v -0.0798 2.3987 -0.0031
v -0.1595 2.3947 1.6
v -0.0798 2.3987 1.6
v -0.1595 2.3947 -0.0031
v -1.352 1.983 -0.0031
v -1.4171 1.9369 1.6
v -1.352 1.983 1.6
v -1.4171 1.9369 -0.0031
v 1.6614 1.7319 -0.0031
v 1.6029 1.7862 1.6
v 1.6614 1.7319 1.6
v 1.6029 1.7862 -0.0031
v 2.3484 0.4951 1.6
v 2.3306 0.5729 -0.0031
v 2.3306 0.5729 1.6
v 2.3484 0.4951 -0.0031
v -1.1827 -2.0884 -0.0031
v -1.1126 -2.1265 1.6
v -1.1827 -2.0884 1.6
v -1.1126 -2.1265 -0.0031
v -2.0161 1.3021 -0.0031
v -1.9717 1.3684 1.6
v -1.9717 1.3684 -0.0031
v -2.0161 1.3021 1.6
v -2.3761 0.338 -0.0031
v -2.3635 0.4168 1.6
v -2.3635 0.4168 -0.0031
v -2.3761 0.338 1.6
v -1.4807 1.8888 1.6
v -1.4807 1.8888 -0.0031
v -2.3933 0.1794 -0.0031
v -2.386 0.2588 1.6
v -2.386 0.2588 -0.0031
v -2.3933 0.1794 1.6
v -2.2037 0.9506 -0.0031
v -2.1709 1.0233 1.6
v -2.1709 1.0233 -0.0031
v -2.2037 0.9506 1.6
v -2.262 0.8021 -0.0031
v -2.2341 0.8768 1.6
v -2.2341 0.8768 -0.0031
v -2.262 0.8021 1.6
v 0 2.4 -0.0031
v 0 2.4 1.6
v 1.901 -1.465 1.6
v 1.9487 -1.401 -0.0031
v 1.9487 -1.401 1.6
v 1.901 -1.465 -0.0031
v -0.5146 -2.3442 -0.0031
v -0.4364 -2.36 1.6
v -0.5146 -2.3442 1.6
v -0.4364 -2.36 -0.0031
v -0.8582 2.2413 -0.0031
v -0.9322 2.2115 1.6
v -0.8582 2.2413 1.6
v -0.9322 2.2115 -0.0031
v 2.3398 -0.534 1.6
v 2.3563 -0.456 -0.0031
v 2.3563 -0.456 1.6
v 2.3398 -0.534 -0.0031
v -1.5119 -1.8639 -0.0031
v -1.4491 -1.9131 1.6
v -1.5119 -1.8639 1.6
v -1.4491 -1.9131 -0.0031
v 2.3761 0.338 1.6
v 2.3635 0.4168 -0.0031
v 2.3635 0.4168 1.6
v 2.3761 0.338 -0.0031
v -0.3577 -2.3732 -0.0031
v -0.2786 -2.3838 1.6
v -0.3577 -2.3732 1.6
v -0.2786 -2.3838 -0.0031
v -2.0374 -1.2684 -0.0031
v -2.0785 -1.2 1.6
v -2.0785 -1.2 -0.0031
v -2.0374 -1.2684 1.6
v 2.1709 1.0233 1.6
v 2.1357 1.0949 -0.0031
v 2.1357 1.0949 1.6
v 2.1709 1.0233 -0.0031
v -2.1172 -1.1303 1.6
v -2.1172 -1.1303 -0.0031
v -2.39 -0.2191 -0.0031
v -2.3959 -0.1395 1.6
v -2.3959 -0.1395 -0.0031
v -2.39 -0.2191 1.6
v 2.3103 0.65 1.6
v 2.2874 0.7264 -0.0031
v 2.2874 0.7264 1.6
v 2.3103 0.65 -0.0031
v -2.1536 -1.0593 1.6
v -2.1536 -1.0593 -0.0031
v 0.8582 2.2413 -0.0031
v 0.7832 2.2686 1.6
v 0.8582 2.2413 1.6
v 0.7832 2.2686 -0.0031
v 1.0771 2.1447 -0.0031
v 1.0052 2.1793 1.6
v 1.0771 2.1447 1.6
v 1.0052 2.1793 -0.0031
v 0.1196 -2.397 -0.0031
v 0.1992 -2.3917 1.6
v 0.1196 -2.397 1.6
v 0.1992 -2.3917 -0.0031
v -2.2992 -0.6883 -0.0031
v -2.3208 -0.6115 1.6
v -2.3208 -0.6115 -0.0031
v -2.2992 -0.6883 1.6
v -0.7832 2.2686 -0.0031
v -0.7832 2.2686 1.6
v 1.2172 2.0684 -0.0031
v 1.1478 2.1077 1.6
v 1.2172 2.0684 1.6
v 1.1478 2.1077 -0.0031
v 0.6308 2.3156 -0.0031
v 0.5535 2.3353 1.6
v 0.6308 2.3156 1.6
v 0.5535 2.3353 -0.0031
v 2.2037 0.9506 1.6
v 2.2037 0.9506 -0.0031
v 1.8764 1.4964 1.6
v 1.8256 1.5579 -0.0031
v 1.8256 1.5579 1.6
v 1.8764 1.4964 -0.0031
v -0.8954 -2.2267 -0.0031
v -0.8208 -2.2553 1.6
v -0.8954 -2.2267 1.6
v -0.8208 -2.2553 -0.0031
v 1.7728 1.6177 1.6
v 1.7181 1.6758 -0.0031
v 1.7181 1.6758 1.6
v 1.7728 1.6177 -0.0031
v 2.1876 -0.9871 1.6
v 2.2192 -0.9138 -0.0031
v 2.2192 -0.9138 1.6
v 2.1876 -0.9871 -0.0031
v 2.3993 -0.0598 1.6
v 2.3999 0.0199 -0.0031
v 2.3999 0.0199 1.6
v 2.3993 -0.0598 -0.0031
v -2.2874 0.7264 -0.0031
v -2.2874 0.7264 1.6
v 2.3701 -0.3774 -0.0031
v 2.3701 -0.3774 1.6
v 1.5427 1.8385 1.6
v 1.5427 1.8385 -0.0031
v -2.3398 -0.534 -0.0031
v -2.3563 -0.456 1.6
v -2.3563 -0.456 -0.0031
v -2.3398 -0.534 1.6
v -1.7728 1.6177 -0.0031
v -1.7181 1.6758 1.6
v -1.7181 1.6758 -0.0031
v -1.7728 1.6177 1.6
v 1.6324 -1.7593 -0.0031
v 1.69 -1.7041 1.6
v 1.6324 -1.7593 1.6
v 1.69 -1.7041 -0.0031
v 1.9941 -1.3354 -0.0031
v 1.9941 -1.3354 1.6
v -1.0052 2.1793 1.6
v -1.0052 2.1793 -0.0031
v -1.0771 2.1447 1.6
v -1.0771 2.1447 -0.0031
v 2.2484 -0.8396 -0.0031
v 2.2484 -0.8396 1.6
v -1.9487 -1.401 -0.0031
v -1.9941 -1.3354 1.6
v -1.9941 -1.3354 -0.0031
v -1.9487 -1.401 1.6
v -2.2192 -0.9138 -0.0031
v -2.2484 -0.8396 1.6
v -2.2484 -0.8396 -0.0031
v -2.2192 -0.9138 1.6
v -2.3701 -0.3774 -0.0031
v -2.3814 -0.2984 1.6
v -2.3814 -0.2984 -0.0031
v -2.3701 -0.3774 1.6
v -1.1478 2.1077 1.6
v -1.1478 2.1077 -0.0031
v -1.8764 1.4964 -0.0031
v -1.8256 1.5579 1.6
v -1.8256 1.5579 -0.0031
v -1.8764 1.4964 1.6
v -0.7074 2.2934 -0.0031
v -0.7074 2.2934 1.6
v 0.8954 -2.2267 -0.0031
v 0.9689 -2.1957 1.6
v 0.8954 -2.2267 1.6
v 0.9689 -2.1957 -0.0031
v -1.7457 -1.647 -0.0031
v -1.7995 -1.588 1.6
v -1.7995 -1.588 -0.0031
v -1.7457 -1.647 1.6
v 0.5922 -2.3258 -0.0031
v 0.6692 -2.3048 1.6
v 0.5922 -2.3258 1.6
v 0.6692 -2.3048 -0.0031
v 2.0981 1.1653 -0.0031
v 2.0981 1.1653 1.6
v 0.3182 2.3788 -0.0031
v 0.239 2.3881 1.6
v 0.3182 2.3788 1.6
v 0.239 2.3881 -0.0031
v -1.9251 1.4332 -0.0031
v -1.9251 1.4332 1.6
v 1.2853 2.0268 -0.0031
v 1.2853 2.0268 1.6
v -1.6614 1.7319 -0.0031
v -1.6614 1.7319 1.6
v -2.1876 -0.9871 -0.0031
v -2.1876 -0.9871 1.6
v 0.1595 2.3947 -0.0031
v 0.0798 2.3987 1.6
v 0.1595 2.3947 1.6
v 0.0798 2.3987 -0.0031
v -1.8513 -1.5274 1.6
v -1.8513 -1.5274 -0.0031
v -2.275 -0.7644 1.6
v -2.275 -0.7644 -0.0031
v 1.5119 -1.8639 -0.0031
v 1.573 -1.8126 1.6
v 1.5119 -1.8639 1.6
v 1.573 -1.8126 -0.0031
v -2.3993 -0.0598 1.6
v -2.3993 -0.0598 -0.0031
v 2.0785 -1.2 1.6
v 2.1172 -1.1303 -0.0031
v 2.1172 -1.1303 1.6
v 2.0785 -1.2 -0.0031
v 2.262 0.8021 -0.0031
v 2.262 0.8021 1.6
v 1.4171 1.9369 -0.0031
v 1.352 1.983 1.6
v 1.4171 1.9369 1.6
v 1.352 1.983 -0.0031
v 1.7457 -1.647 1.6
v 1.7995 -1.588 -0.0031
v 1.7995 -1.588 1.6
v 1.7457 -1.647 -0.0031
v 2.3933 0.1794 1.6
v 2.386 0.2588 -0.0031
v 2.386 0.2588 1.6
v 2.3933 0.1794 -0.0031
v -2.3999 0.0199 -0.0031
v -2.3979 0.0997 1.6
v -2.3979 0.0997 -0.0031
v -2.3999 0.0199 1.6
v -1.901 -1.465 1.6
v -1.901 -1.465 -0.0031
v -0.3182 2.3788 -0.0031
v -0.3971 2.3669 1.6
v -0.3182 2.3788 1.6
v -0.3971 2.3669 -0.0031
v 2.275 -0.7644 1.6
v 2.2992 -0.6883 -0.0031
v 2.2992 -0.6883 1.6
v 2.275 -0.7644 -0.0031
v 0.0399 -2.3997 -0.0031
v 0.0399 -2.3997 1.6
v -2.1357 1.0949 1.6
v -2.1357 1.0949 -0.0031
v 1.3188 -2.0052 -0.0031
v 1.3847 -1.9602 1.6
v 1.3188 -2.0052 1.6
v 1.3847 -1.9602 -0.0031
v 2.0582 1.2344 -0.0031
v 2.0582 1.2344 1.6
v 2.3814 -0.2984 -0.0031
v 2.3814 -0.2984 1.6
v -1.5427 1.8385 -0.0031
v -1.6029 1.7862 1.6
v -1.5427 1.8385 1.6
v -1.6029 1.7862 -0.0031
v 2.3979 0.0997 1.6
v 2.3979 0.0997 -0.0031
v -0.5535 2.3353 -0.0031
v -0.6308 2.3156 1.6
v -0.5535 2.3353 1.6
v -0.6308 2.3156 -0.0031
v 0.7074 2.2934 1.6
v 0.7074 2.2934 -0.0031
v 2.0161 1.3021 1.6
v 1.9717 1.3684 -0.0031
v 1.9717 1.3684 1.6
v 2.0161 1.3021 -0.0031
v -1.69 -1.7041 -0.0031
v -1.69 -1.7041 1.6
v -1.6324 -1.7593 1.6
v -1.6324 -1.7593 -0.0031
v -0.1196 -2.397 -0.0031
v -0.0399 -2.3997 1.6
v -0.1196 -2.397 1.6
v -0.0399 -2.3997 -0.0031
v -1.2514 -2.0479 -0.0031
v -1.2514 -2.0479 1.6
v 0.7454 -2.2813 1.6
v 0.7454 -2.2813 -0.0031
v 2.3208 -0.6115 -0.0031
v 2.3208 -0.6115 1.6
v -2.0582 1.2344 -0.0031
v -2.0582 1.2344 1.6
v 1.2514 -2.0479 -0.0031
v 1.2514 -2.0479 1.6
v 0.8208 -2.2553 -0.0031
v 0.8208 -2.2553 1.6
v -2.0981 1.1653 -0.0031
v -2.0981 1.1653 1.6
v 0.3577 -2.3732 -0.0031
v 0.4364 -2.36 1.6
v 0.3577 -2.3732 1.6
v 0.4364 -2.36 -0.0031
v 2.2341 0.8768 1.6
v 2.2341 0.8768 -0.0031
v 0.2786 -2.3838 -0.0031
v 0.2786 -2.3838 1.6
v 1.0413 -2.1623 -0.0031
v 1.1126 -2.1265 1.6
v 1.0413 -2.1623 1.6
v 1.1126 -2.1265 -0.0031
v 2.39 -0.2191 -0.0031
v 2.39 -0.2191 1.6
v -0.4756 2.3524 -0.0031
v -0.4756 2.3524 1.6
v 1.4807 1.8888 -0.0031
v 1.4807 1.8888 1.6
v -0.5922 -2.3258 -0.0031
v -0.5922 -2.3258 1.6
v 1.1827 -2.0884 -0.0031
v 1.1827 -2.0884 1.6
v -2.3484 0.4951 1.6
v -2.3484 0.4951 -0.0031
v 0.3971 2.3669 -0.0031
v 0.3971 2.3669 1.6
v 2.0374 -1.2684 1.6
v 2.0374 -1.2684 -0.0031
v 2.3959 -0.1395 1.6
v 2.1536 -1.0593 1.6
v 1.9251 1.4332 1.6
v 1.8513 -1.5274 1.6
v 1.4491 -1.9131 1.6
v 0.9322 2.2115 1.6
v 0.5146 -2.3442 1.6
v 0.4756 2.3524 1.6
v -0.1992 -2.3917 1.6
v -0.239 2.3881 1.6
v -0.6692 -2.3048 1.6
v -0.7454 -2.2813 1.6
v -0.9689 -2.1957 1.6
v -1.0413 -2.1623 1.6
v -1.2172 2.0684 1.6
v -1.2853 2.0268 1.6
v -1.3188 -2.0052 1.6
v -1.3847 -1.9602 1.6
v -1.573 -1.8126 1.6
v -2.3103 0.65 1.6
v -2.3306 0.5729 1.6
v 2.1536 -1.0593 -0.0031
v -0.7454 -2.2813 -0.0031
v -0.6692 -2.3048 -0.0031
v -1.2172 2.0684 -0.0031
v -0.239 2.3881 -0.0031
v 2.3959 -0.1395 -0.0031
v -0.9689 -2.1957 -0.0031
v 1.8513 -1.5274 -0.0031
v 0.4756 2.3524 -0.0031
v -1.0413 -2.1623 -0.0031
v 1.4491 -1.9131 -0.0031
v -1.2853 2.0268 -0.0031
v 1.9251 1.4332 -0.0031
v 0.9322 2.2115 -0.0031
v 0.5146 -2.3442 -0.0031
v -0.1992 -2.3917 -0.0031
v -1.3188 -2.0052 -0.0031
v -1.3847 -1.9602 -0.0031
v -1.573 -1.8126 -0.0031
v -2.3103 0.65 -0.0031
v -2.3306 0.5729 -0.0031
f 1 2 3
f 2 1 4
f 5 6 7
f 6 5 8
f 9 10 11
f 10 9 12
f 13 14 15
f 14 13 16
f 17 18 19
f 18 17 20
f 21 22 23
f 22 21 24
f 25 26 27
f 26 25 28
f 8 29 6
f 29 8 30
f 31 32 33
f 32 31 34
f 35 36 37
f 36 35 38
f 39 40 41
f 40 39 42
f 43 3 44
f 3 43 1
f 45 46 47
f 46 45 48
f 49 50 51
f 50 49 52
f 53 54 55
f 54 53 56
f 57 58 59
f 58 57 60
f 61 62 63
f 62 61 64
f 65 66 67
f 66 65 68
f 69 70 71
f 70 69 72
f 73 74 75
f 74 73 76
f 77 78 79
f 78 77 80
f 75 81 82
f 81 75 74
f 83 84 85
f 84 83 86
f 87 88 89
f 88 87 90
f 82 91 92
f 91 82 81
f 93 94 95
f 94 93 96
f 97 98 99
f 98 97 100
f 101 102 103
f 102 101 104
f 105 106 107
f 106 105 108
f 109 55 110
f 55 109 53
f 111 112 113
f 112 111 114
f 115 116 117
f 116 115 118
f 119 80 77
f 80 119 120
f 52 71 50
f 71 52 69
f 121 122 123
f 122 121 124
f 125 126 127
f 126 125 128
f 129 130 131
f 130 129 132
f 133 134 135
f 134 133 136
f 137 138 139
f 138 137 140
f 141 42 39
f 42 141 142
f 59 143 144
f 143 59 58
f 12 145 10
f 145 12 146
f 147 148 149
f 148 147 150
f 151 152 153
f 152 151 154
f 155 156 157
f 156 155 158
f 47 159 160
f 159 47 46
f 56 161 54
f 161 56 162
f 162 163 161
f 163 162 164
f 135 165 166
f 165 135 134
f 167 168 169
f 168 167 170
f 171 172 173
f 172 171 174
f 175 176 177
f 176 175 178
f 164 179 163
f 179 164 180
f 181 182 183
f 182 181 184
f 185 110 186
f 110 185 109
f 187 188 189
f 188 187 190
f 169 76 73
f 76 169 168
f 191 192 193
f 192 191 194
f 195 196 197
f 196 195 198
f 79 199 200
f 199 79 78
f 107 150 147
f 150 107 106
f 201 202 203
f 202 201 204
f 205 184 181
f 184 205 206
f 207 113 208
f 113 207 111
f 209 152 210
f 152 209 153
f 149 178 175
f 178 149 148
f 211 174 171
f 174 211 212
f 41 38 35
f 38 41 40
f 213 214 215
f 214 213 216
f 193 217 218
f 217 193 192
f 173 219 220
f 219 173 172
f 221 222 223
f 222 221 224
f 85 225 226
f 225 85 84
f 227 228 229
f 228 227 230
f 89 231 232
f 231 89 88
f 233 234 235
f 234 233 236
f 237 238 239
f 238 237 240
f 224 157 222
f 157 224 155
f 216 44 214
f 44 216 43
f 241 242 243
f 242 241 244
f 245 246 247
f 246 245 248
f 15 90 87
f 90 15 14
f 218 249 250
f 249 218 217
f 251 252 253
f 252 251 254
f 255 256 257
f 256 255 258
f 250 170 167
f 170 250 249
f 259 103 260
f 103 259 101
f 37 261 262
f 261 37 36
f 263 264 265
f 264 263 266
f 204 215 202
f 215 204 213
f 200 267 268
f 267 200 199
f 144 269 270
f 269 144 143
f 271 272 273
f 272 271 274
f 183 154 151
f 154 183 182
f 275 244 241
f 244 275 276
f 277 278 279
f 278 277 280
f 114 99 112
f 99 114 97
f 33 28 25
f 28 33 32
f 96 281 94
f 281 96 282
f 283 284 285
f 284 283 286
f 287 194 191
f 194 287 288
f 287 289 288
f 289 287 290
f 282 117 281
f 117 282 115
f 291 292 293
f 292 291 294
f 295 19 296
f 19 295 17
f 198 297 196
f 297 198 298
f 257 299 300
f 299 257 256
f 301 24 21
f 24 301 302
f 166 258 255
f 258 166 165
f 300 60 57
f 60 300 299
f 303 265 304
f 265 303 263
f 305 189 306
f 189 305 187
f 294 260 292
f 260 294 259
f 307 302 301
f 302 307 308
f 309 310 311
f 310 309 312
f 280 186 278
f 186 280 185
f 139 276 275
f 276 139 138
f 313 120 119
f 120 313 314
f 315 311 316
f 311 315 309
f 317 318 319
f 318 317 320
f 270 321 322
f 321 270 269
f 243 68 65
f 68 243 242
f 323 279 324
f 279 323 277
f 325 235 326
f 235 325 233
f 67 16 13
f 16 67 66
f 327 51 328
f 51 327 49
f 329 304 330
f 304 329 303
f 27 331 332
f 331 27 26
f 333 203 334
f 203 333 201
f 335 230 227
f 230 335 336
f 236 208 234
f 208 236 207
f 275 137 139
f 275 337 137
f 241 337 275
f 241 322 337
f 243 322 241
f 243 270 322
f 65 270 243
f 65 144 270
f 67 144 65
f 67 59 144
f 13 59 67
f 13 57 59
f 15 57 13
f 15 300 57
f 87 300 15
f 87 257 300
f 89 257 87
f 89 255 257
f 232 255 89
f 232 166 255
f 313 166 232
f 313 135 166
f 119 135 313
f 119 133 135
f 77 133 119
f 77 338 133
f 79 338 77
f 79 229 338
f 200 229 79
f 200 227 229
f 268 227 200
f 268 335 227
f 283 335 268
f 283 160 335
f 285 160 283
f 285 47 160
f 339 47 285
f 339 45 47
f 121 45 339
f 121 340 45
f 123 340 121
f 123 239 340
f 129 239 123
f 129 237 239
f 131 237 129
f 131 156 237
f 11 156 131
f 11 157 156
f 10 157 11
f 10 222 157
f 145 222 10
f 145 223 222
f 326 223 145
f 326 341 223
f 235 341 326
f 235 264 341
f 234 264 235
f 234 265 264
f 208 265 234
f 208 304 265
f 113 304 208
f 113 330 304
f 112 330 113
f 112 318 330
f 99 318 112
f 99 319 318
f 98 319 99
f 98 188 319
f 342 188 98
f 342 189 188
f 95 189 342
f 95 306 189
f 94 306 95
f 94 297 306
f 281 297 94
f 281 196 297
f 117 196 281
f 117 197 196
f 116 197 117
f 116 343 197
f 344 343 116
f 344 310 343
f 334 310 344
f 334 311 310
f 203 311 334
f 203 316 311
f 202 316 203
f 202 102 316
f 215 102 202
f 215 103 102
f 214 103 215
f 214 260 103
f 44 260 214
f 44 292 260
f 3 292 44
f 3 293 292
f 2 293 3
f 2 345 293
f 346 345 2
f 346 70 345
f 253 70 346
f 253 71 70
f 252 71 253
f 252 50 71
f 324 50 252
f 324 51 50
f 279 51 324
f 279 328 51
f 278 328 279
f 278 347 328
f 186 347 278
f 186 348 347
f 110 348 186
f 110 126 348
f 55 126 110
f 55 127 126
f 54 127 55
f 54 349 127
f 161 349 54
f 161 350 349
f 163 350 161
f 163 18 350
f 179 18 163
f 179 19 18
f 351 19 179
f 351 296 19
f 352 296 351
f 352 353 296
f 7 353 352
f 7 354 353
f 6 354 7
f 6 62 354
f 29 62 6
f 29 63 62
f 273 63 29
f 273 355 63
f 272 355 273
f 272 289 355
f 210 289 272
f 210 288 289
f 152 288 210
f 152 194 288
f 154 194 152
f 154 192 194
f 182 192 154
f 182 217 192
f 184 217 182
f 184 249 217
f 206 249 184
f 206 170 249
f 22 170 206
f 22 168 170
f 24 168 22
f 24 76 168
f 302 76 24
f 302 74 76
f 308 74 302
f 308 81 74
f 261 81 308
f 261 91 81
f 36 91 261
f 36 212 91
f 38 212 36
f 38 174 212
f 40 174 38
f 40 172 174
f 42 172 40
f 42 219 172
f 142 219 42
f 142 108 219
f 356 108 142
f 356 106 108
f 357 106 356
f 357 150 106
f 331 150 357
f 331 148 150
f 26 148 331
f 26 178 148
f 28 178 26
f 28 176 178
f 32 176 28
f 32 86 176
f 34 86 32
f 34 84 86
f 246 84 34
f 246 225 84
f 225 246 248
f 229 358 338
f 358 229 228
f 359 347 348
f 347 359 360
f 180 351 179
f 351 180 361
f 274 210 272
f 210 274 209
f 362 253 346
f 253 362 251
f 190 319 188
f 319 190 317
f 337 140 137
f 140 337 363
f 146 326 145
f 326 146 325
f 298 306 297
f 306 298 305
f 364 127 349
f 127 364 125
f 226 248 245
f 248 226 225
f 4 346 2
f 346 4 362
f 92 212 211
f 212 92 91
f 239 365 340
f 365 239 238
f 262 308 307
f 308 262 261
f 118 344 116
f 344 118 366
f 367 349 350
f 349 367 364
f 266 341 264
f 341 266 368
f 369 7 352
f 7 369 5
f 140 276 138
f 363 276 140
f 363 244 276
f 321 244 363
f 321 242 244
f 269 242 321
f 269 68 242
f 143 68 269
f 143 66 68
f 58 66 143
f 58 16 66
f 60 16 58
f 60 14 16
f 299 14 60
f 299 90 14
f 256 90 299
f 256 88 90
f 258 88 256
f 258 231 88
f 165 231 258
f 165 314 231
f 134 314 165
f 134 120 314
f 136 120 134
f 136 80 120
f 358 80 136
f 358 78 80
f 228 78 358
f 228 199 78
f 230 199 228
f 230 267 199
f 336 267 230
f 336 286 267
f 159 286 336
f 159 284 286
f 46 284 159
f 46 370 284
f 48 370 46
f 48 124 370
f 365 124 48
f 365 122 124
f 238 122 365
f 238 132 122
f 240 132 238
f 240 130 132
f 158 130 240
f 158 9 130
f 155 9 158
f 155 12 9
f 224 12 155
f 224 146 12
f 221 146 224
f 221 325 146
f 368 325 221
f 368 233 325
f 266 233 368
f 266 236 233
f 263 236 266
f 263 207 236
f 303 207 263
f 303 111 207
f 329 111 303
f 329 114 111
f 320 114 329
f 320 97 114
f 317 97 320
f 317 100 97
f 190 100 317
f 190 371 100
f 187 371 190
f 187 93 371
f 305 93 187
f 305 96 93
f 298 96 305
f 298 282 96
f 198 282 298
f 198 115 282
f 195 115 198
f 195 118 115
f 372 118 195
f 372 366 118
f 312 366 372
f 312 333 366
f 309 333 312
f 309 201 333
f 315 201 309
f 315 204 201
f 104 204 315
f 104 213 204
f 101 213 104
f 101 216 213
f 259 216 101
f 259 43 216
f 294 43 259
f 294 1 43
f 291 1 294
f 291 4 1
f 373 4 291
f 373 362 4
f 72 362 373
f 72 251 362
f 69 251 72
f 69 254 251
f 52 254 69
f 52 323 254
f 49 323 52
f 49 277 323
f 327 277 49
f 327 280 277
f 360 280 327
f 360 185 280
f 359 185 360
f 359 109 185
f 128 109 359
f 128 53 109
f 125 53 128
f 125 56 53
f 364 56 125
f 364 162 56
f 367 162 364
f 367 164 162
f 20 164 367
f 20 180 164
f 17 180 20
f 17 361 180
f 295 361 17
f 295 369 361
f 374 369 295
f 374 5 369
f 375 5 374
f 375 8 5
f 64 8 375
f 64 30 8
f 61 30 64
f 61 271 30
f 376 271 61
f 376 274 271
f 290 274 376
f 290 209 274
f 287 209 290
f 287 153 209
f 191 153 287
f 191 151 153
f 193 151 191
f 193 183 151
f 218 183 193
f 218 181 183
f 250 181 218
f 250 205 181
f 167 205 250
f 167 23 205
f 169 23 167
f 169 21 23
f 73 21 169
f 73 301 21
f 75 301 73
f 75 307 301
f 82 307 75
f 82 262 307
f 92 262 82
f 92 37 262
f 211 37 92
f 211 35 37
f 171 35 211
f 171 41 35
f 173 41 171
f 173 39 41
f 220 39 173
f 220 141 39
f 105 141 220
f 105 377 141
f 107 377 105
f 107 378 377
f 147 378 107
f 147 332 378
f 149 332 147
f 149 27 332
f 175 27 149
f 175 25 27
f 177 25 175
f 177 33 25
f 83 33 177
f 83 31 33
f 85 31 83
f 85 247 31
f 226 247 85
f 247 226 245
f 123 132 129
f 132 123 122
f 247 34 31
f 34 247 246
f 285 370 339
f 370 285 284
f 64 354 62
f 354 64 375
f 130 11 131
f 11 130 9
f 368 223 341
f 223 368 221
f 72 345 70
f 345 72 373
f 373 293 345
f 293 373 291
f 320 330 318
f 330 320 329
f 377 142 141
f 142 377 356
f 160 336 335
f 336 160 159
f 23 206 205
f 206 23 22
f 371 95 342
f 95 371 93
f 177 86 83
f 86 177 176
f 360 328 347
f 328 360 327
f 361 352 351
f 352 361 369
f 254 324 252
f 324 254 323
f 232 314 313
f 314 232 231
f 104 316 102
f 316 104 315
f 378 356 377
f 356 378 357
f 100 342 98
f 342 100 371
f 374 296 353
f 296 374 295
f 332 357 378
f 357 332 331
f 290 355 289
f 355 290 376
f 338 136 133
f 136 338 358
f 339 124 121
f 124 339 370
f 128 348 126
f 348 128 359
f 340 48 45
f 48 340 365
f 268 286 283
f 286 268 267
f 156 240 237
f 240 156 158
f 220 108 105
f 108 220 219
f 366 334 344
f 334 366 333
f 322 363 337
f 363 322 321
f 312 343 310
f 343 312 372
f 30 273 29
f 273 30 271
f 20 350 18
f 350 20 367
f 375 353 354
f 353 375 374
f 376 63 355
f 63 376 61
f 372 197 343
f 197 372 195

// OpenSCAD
use <../lib.scad>
use <../p/48/1-4cylo.scad>
use <../p/48/1-4ndis.scad>
use <../p/box2-5.scad>
use <../p/box3u6.scad>
use <../p/rect.scad>
use <../p/stud.scad>
$fa=1; $fs=0.2;
function ldraw_lib__18653(realsolid=false) = [
// 0 Arch  1 x  3 x  2 Inverted
// 0 Name: 18653.dat
// 0 Author: Rolf Osterthun [Rolf]
// 0 !LDRAW_ORG Part UPDATE 2015-01
// 0 !LICENSE Licensed under CC BY 2.0 and CC BY 4.0 : see CAreadme.txt
// 
// 0 BFC CERTIFY CCW
  [0,"BFC","CERTIFY"],
  [0,"BFC","CCW"],
// 
// 0 !HISTORY 2015-10-11 [PTadmin] Official Update 2015-01
// 
// 
// 1 16 5 4 5.5 0 0 -1.5 0 44 0 0.5 0 0 box3u6.dat
  [1,16,5,4,5.5,0,0,-1.5,0,44,0,0.5,0,0, ldraw_lib__box3u6(realsolid)],
// 3 16 6.5 48 5 5 48 3.5 3.5 48 5
  [3,16,6.5,48,5,5,48,3.5,3.5,48,5],
// 1 16 5 26 5 0 0.75 -0.75 22 0 0 0 -0.75 -0.75 box2-5.dat
  [1,16,5,26,5,0,0.75,-0.75,22,0,0,0,-0.75,-0.75, ldraw_lib__box2_5(realsolid)],
// 1 16 5 4 -5.5 0 0 1.5 0 44 0 -0.5 0 0 box3u6.dat
  [1,16,5,4,-5.5,0,0,1.5,0,44,0,-0.5,0,0, ldraw_lib__box3u6(realsolid)],
// 3 16 3.5 48 -5 5 48 -3.5 6.5 48 -5
  [3,16,3.5,48,-5,5,48,-3.5,6.5,48,-5],
// 1 16 5 26 -5 0 -0.75 0.75 22 0 0 0 0.75 0.75 box2-5.dat
  [1,16,5,26,-5,0,-0.75,0.75,22,0,0,0,0.75,0.75, ldraw_lib__box2_5(realsolid)],
// 
// 1 16 15 27 5.5 0 0 -1.5 0 21 0 0.5 0 0 box3u6.dat
  [1,16,15,27,5.5,0,0,-1.5,0,21,0,0.5,0,0, ldraw_lib__box3u6(realsolid)],
// 3 16 16.5 48 5 15 48 3.5 13.5 48 5
  [3,16,16.5,48,5,15,48,3.5,13.5,48,5],
// 1 16 15 37.5 5 0 0.75 -0.75 10.5 0 0 0 -0.75 -0.75 box2-5.dat
  [1,16,15,37.5,5,0,0.75,-0.75,10.5,0,0,0,-0.75,-0.75, ldraw_lib__box2_5(realsolid)],
// 1 16 15 27 -5.5 0 0 1.5 0 21 0 -0.5 0 0 box3u6.dat
  [1,16,15,27,-5.5,0,0,1.5,0,21,0,-0.5,0,0, ldraw_lib__box3u6(realsolid)],
// 3 16 13.5 48 -5 15 48 -3.5 16.5 48 -5
  [3,16,13.5,48,-5,15,48,-3.5,16.5,48,-5],
// 1 16 15 37.5 -5 0 -0.75 0.75 10.5 0 0 0 0.75 0.75 box2-5.dat
  [1,16,15,37.5,-5,0,-0.75,0.75,10.5,0,0,0,0.75,0.75, ldraw_lib__box2_5(realsolid)],
// 
// 1 16 25 36 5.5 0 0 -1.5 0 12 0 0.5 0 0 box3u6.dat
  [1,16,25,36,5.5,0,0,-1.5,0,12,0,0.5,0,0, ldraw_lib__box3u6(realsolid)],
// 3 16 26.5 48 5 25 48 3.5 23.5 48 5
  [3,16,26.5,48,5,25,48,3.5,23.5,48,5],
// 1 16 25 42 5 0 0.75 -0.75 6 0 0 0 -0.75 -0.75 box2-5.dat
  [1,16,25,42,5,0,0.75,-0.75,6,0,0,0,-0.75,-0.75, ldraw_lib__box2_5(realsolid)],
// 1 16 25 36 -5.5 0 0 1.5 0 12 0 -0.5 0 0 box3u6.dat
  [1,16,25,36,-5.5,0,0,1.5,0,12,0,-0.5,0,0, ldraw_lib__box3u6(realsolid)],
// 3 16 23.5 48 -5 25 48 -3.5 26.5 48 -5
  [3,16,23.5,48,-5,25,48,-3.5,26.5,48,-5],
// 1 16 25 42 -5 0 -0.75 0.75 6 0 0 0 0.75 0.75 box2-5.dat
  [1,16,25,42,-5,0,-0.75,0.75,6,0,0,0,0.75,0.75, ldraw_lib__box2_5(realsolid)],
// 
// 1 16 35 41 5.5 0 0 -1.5 0 7 0 0.5 0 0 box3u6.dat
  [1,16,35,41,5.5,0,0,-1.5,0,7,0,0.5,0,0, ldraw_lib__box3u6(realsolid)],
// 3 16 36.5 48 5 35 48 3.5 33.5 48 5
  [3,16,36.5,48,5,35,48,3.5,33.5,48,5],
// 1 16 35 44.5 5 0 0.75 -0.75 3.5 0 0 0 -0.75 -0.75 box2-5.dat
  [1,16,35,44.5,5,0,0.75,-0.75,3.5,0,0,0,-0.75,-0.75, ldraw_lib__box2_5(realsolid)],
// 1 16 35 41 -5.5 0 0 1.5 0 7 0 -0.5 0 0 box3u6.dat
  [1,16,35,41,-5.5,0,0,1.5,0,7,0,-0.5,0,0, ldraw_lib__box3u6(realsolid)],
// 3 16 33.5 48 -5 35 48 -3.5 36.5 48 -5
  [3,16,33.5,48,-5,35,48,-3.5,36.5,48,-5],
// 1 16 35 44.5 -5 0 -0.75 0.75 3.5 0 0 0 0.75 0.75 box2-5.dat
  [1,16,35,44.5,-5,0,-0.75,0.75,3.5,0,0,0,0.75,0.75, ldraw_lib__box2_5(realsolid)],
// 
// 4 16 -10 48 -10 -6 48 -6 46 48 -6 50 48 -10
  [4,16,-10,48,-10,-6,48,-6,46,48,-6,50,48,-10],
// 4 16 50 48 -10 46 48 -6 46 48 6 50 48 10
  [4,16,50,48,-10,46,48,-6,46,48,6,50,48,10],
// 4 16 50 48 10 46 48 6 -6 48 6 -10 48 10
  [4,16,50,48,10,46,48,6,-6,48,6,-10,48,10],
// 4 16 -10 48 10 -6 48 6 -6 48 -6 -10 48 -10
  [4,16,-10,48,10,-6,48,6,-6,48,-6,-10,48,-10],
// 
// 0 BFC INVERTNEXT
  [0,"BFC","INVERTNEXT"],
// 1 16 0 26 0 0 -6 0 0 0 -22 6 0 0 box2-5.dat
  [1,16,0,26,0,0,-6,0,0,0,-22,6,0,0, ldraw_lib__box2_5(realsolid)],
// 1 16 46 4 -6 0 0 -40 40 0 0 0 -1 0 48\1-4ndis.dat
  [1,16,46,4,-6,0,0,-40,40,0,0,0,-1,0, ldraw_lib__48__1_4ndis(realsolid)],
// 1 16 46 4 6 -40 0 0 0 0 40 0 1 0 48\1-4ndis.dat
  [1,16,46,4,6,-40,0,0,0,0,40,0,1,0, ldraw_lib__48__1_4ndis(realsolid)],
// 1 16 46 4 6 0 0 -40 40 0 0 0 -12 0 48\1-4cylo.dat
  [1,16,46,4,6,0,0,-40,40,0,0,0,-12,0, ldraw_lib__48__1_4cylo(realsolid)],
// 4 16 -6 48 6 6 44 6 6 4 6 -6 4 6
  [4,16,-6,48,6,6,44,6,6,4,6,-6,4,6],
// 4 16 6 44 6 -6 48 6 46 48 6 46 44 6
  [4,16,6,44,6,-6,48,6,46,48,6,46,44,6],
// 4 16 -6 4 -6 6 4 -6 6 44 -6 -6 48 -6
  [4,16,-6,4,-6,6,4,-6,6,44,-6,-6,48,-6],
// 4 16 46 44 -6 46 48 -6 -6 48 -6 6 44 -6
  [4,16,46,44,-6,46,48,-6,-6,48,-6,6,44,-6],
// 1 16 46 46 0 0 1 0 0 0 2 6 0 0 rect.dat
  [1,16,46,46,0,0,1,0,0,0,2,6,0,0, ldraw_lib__rect(realsolid)],
// 2 24 -6 48 6 3.5 48 6
  [2,24,-6,48,6,3.5,48,6],
// 2 24 6.5 48 6 13.5 48 6
  [2,24,6.5,48,6,13.5,48,6],
// 2 24 16.5 48 6 23.5 48 6
  [2,24,16.5,48,6,23.5,48,6],
// 2 24 26.5 48 6 33.5 48 6
  [2,24,26.5,48,6,33.5,48,6],
// 2 24 36.5 48 6 46 48 6
  [2,24,36.5,48,6,46,48,6],
// 2 24 -6 48 -6 3.5 48 -6
  [2,24,-6,48,-6,3.5,48,-6],
// 2 24 6.5 48 -6 13.5 48 -6
  [2,24,6.5,48,-6,13.5,48,-6],
// 2 24 16.5 48 -6 23.5 48 -6
  [2,24,16.5,48,-6,23.5,48,-6],
// 2 24 26.5 48 -6 33.5 48 -6
  [2,24,26.5,48,-6,33.5,48,-6],
// 2 24 36.5 48 -6 46 48 -6
  [2,24,36.5,48,-6,46,48,-6],
// 2 24 6.5 10.005 5 6.5 10.005 6
  [2,24,6.5,10.005,5,6.5,10.005,6],
// 2 24 6.344 9.22 4.844 6.5 10.005 5
  [2,24,6.344,9.22,4.844,6.5,10.005,5],
// 2 24 6 4 4.5 6.344 9.22 4.844
  [2,24,6,4,4.5,6.344,9.22,4.844],
// 2 24 6.5 10.005 -6 6.5 10.005 -5
  [2,24,6.5,10.005,-6,6.5,10.005,-5],
// 2 24 6 4 -4.5 6.344 9.22 -4.844
  [2,24,6,4,-4.5,6.344,9.22,-4.844],
// 2 24 6.344 9.22 -4.844 6.5 10.005 -5
  [2,24,6.344,9.22,-4.844,6.5,10.005,-5],
// 2 24 13.5 27.207 5 13.5 27.207 6
  [2,24,13.5,27.207,5,13.5,27.207,6],
// 2 24 16.5 30.899 5 16.5 30.899 6
  [2,24,16.5,30.899,5,16.5,30.899,6],
// 2 24 15 29.19 3.5 16.5 30.899 5
  [2,24,15,29.19,3.5,16.5,30.899,5],
// 2 24 14.264 28.352 4.236 15 29.19 3.5
  [2,24,14.264,28.352,4.236,15,29.19,3.5],
// 2 24 13.5 27.207 5 14.264 28.352 4.236
  [2,24,13.5,27.207,5,14.264,28.352,4.236],
// 2 24 16.5 30.899 -6 16.5 30.899 -5
  [2,24,16.5,30.899,-6,16.5,30.899,-5],
// 2 24 13.5 27.207 -6 13.5 27.207 -5
  [2,24,13.5,27.207,-6,13.5,27.207,-5],
// 2 24 13.5 27.207 -5 14.264 28.352 -4.236
  [2,24,13.5,27.207,-5,14.264,28.352,-4.236],
// 2 24 14.264 28.352 -4.236 15 29.19 -3.5
  [2,24,14.264,28.352,-4.236,15,29.19,-3.5],
// 2 24 15 29.19 -3.5 16.5 30.899 -5
  [2,24,15,29.19,-3.5,16.5,30.899,-5],
// 2 24 23.5 36.972 5 23.5 36.972 6
  [2,24,23.5,36.972,5,23.5,36.972,6],
// 2 24 26.5 38.887 5 26.5 38.887 6
  [2,24,26.5,38.887,5,26.5,38.887,6],
// 2 24 26 38.64 4.5 26.5 38.887 5
  [2,24,26,38.64,4.5,26.5,38.887,5],
// 2 24 25 37.973 3.5 26 38.64 4.5
  [2,24,25,37.973,3.5,26,38.64,4.5],
// 2 24 23.5 36.972 5 25 37.973 3.5
  [2,24,23.5,36.972,5,25,37.973,3.5],
// 2 24 26.5 38.887 -6 26.5 38.887 -5
  [2,24,26.5,38.887,-6,26.5,38.887,-5],
// 2 24 23.5 36.972 -6 23.5 36.972 -5
  [2,24,23.5,36.972,-6,23.5,36.972,-5],
// 2 24 23.5 36.972 -5 25 37.973 -3.5
  [2,24,23.5,36.972,-5,25,37.973,-3.5],
// 2 24 26 38.64 -4.5 26.5 38.887 -5
  [2,24,26,38.64,-4.5,26.5,38.887,-5],
// 2 24 25 37.973 -3.5 26 38.64 -4.5
  [2,24,25,37.973,-3.5,26,38.64,-4.5],
// 2 24 33.5 41.908 5 33.5 41.908 6
  [2,24,33.5,41.908,5,33.5,41.908,6],
// 2 24 36.5 42.805 5 36.5 42.805 6
  [2,24,36.5,42.805,5,36.5,42.805,6],
// 2 24 35.648 42.636 4.148 36.5 42.805 5
  [2,24,35.648,42.636,4.148,36.5,42.805,5],
// 2 24 35 42.416 3.5 35.648 42.636 4.148
  [2,24,35,42.416,3.5,35.648,42.636,4.148],
// 2 24 33.5 41.908 5 35 42.416 3.5
  [2,24,33.5,41.908,5,35,42.416,3.5],
// 2 24 36.5 42.805 -6 36.5 42.805 -5
  [2,24,36.5,42.805,-6,36.5,42.805,-5],
// 2 24 33.5 41.908 -6 33.5 41.908 -5
  [2,24,33.5,41.908,-6,33.5,41.908,-5],
// 2 24 33.5 41.908 -5 35 42.416 -3.5
  [2,24,33.5,41.908,-5,35,42.416,-3.5],
// 2 24 35.648 42.636 -4.148 36.5 42.805 -5
  [2,24,35.648,42.636,-4.148,36.5,42.805,-5],
// 2 24 35 42.416 -3.5 35.648 42.636 -4.148
  [2,24,35,42.416,-3.5,35.648,42.636,-4.148],
// 
// 1 16 0 24 0 0 -10 0 0 0 -24 10 0 0 box2-5.dat
  [1,16,0,24,0,0,-10,0,0,0,-24,10,0,0, ldraw_lib__box2_5(realsolid)],
// 1 16 50 0 10 0 0 -40 40 0 0 0 -1 0 48\1-4ndis.dat
  [1,16,50,0,10,0,0,-40,40,0,0,0,-1,0, ldraw_lib__48__1_4ndis(realsolid)],
// 1 16 50 0 -10 -40 0 0 0 0 40 0 1 0 48\1-4ndis.dat
  [1,16,50,0,-10,-40,0,0,0,0,40,0,1,0, ldraw_lib__48__1_4ndis(realsolid)],
// 0 BFC INVERTNEXT
  [0,"BFC","INVERTNEXT"],
// 1 16 50 0 10 0 0 -40 40 0 0 0 -20 0 48\1-4cylo.dat
  [1,16,50,0,10,0,0,-40,40,0,0,0,-20,0, ldraw_lib__48__1_4cylo(realsolid)],
// 4 16 -10 0 10 10 0 10 10 40 10 -10 48 10
  [4,16,-10,0,10,10,0,10,10,40,10,-10,48,10],
// 4 16 50 40 10 50 48 10 -10 48 10 10 40 10
  [4,16,50,40,10,50,48,10,-10,48,10,10,40,10],
// 4 16 -10 48 -10 10 40 -10 10 0 -10 -10 0 -10
  [4,16,-10,48,-10,10,40,-10,10,0,-10,-10,0,-10],
// 4 16 10 40 -10 -10 48 -10 50 48 -10 50 40 -10
  [4,16,10,40,-10,-10,48,-10,50,48,-10,50,40,-10],
// 1 16 50 44 0 0 -1 0 0 0 4 -10 0 0 rect.dat
  [1,16,50,44,0,0,-1,0,0,0,4,-10,0,0, ldraw_lib__rect(realsolid)],
// 2 24 -10 48 10 50 48 10
  [2,24,-10,48,10,50,48,10],
// 2 24 -10 48 -10 50 48 -10
  [2,24,-10,48,-10,50,48,-10],
// 
// 1 16 0 0 0 -1 0 0 0 1 0 0 0 -1 stud.dat
  [1,16,0,0,0,-1,0,0,0,1,0,0,0,-1, ldraw_lib__stud(realsolid)],
];
module ldraw_lib__18653(step=0, col=false, unit=2/5, alt=false, line=0.2, solid=!$preview)
    makepoly(ldraw_lib__18653(solid), step=step, col=col, unit=unit, alt=alt, line=line, solid=solid);
ldraw_lib__18653(line=0.2);
